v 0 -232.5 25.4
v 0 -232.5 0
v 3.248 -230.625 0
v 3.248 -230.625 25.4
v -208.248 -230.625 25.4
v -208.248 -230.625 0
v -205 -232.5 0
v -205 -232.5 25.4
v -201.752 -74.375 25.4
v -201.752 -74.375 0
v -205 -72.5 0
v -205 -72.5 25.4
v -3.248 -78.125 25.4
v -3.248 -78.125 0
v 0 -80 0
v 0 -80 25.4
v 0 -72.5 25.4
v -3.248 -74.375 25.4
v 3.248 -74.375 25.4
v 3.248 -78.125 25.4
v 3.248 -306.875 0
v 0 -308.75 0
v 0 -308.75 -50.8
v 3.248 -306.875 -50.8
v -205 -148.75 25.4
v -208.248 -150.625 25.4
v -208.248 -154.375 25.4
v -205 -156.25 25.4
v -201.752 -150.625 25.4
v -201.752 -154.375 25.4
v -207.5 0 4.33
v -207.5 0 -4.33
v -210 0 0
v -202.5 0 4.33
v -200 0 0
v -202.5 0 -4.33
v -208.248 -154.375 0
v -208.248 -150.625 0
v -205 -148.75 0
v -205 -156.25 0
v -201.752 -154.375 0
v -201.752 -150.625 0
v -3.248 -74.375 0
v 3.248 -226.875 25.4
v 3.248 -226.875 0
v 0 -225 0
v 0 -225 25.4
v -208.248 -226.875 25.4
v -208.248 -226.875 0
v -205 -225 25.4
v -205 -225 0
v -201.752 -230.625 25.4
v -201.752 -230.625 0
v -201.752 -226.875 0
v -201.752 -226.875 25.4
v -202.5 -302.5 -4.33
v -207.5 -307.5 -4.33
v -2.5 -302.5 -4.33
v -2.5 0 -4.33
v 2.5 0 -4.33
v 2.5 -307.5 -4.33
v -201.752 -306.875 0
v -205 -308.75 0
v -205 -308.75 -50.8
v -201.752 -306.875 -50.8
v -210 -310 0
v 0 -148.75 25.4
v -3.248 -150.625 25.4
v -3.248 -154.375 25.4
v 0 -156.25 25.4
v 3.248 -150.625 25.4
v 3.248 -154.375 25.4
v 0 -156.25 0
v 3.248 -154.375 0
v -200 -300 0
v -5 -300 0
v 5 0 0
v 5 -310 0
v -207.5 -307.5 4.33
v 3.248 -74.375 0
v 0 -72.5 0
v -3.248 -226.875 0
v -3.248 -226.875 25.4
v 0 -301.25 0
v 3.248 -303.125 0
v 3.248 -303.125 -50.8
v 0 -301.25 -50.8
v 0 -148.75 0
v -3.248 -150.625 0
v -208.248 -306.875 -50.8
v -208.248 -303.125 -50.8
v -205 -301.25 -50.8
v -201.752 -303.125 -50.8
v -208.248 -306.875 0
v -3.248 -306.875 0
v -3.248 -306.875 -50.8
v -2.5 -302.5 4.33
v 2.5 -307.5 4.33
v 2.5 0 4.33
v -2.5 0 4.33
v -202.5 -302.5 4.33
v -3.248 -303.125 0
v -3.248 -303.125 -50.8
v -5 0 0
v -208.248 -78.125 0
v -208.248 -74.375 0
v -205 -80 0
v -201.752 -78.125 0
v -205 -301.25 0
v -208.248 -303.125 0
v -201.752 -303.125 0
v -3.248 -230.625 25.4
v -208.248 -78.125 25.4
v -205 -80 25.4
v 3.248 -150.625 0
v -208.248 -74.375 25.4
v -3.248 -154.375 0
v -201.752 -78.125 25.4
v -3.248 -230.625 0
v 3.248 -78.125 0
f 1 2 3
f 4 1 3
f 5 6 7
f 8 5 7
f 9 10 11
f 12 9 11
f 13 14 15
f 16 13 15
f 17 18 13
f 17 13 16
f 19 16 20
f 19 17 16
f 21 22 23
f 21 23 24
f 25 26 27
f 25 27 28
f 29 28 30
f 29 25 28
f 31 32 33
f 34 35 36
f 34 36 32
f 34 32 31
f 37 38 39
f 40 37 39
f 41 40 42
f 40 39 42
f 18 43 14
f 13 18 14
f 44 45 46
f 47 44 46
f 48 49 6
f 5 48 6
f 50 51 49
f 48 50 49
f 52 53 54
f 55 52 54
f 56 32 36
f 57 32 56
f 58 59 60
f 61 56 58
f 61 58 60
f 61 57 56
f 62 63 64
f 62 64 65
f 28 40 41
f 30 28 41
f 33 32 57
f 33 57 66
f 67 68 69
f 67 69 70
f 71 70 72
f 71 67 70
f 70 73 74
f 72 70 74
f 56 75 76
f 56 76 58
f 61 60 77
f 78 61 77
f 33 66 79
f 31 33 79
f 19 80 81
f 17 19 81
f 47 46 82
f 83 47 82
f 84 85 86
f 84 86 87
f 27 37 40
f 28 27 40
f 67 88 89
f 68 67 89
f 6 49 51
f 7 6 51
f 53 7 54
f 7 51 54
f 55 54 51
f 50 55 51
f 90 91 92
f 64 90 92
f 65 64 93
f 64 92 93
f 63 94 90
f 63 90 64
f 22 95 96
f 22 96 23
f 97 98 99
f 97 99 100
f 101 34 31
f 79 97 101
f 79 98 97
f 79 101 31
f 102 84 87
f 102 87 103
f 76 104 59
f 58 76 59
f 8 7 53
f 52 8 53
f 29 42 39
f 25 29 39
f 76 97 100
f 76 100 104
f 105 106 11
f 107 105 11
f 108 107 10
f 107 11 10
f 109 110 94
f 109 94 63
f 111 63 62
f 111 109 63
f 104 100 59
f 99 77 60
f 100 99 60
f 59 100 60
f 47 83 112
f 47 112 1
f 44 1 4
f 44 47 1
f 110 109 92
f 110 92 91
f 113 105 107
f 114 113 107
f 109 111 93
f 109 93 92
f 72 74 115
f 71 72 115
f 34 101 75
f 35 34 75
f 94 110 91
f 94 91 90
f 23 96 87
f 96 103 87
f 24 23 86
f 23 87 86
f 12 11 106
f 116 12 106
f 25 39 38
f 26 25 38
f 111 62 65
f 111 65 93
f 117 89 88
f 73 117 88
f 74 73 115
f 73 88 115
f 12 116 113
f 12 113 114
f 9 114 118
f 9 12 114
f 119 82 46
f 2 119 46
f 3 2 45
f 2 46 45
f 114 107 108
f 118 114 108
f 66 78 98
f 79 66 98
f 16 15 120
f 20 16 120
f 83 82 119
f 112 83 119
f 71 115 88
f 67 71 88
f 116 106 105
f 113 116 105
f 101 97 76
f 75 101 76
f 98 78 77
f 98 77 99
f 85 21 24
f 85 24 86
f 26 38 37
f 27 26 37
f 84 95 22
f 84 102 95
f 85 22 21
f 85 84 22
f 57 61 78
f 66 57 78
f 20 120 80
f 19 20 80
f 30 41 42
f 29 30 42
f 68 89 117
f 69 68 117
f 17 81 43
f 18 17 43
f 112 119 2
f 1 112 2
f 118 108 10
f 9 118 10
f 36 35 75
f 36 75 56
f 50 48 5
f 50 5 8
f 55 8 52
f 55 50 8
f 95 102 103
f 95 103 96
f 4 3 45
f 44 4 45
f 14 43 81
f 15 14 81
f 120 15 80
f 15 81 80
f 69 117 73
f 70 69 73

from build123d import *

# Parameters (mm, degrees)
F2_DEPTH = 25.4
F3_DEPTH = 50.8


with BuildPart() as f1:
    # F1: sweep along a path in F0
    with BuildLine(Plane.XY) as f1_path:
        Line((0, 0), (0, -305))
        Line((0, -305), (-205, -305))
        Line((-205, -305), (-205, 0))
    # F6 (on Front) → F1 (sweep)
    with BuildSketch(Plane.XZ):
        Polygon((2.5, -4.3301270189), (5, 0), (2.5, 4.3301270189), (-2.5, 4.3301270189), (-5, 0), (-2.5, -4.3301270189), align=None)
    sweep(path=f1_path.line, transition=Transition.RIGHT)


with BuildPart() as f2:
    # F0 (on Top) → F2 (new body)
    with BuildSketch(Plane.XY):
        Polygon((0, -225), (0, -232.5), (3.2475952642, -230.625), (3.2475952642, -226.875), align=None)
        Polygon((-3.2475952642, -230.625), (0, -232.5), (0, -225), (-3.2475952642, -226.875), align=None)
    extrude(amount=F2_DEPTH)


with BuildPart() as f2b:
    # F0 (on Top) → F2, piece 2 (new body)
    with BuildSketch(Plane.XY):
        Polygon((0, -148.75), (0, -156.25), (3.2475952642, -154.375), (3.2475952642, -150.625), align=None)
        Polygon((-3.2475952642, -154.375), (0, -156.25), (0, -148.75), (-3.2475952642, -150.625), align=None)
    extrude(amount=F2_DEPTH)


with BuildPart() as f2c:
    # F0 (on Top) → F2, piece 3 (new body)
    with BuildSketch(Plane.XY):
        Polygon((0, -72.5), (0, -80), (3.2475952642, -78.125), (3.2475952642, -74.375), align=None)
        Polygon((-3.2475952642, -78.125), (0, -80), (0, -72.5), (-3.2475952642, -74.375), align=None)
    extrude(amount=F2_DEPTH)


with BuildPart() as f2d:
    # F0 (on Top) → F2, piece 4 (new body)
    with BuildSketch(Plane.XY):
        Polygon((-205, -148.75), (-205, -156.25), (-201.7524047358, -154.375), (-201.7524047358, -150.625), align=None)
        Polygon((-208.2475952642, -154.375), (-205, -156.25), (-205, -148.75), (-208.2475952642, -150.625), align=None)
    extrude(amount=F2_DEPTH)


with BuildPart() as f2e:
    # F0 (on Top) → F2, piece 5 (new body)
    with BuildSketch(Plane.XY):
        Polygon((-205, -225), (-205, -232.5), (-201.7524047358, -230.625), (-201.7524047358, -226.875), align=None)
        Polygon((-208.2475952642, -230.625), (-205, -232.5), (-205, -225), (-208.2475952642, -226.875), align=None)
    extrude(amount=F2_DEPTH)


with BuildPart() as f2f:
    # F0 (on Top) → F2, piece 6 (new body)
    with BuildSketch(Plane.XY):
        Polygon((-205, -72.5), (-205, -80), (-201.7524047358, -78.125), (-201.7524047358, -74.375), align=None)
        Polygon((-208.2475952642, -78.125), (-205, -80), (-205, -72.5), (-208.2475952642, -74.375), align=None)
    extrude(amount=F2_DEPTH)


with BuildPart() as f3:
    # F0 (on Top) → F3 (new body)
    with BuildSketch(Plane.XY):
        Polygon((0, -301.25), (0, -305), (-3.2475952642, -305), (-3.2475952642, -306.875), (0, -308.75), (3.2475952642, -306.875), (3.2475952642, -303.125), align=None)
        Polygon((-3.2475952642, -305), (0, -305), (0, -301.25), (-3.2475952642, -303.125), align=None)
    extrude(amount=-F3_DEPTH)


with BuildPart() as f3b:
    # F0 (on Top) → F3, piece 2 (new body)
    with BuildSketch(Plane.XY):
        Polygon((-205, -305), (-201.7524047358, -305), (-201.7524047358, -303.125), (-205, -301.25), align=None)
        Polygon((-201.7524047358, -306.875), (-201.7524047358, -305), (-205, -305), (-205, -301.25), (-208.2475952642, -303.125), (-208.2475952642, -306.875), (-205, -308.75), align=None)
    extrude(amount=-F3_DEPTH)


solid = Compound([f1.part, f2.part, f2b.part, f2c.part, f2d.part, f2e.part, f2f.part, f3.part, f3b.part])
